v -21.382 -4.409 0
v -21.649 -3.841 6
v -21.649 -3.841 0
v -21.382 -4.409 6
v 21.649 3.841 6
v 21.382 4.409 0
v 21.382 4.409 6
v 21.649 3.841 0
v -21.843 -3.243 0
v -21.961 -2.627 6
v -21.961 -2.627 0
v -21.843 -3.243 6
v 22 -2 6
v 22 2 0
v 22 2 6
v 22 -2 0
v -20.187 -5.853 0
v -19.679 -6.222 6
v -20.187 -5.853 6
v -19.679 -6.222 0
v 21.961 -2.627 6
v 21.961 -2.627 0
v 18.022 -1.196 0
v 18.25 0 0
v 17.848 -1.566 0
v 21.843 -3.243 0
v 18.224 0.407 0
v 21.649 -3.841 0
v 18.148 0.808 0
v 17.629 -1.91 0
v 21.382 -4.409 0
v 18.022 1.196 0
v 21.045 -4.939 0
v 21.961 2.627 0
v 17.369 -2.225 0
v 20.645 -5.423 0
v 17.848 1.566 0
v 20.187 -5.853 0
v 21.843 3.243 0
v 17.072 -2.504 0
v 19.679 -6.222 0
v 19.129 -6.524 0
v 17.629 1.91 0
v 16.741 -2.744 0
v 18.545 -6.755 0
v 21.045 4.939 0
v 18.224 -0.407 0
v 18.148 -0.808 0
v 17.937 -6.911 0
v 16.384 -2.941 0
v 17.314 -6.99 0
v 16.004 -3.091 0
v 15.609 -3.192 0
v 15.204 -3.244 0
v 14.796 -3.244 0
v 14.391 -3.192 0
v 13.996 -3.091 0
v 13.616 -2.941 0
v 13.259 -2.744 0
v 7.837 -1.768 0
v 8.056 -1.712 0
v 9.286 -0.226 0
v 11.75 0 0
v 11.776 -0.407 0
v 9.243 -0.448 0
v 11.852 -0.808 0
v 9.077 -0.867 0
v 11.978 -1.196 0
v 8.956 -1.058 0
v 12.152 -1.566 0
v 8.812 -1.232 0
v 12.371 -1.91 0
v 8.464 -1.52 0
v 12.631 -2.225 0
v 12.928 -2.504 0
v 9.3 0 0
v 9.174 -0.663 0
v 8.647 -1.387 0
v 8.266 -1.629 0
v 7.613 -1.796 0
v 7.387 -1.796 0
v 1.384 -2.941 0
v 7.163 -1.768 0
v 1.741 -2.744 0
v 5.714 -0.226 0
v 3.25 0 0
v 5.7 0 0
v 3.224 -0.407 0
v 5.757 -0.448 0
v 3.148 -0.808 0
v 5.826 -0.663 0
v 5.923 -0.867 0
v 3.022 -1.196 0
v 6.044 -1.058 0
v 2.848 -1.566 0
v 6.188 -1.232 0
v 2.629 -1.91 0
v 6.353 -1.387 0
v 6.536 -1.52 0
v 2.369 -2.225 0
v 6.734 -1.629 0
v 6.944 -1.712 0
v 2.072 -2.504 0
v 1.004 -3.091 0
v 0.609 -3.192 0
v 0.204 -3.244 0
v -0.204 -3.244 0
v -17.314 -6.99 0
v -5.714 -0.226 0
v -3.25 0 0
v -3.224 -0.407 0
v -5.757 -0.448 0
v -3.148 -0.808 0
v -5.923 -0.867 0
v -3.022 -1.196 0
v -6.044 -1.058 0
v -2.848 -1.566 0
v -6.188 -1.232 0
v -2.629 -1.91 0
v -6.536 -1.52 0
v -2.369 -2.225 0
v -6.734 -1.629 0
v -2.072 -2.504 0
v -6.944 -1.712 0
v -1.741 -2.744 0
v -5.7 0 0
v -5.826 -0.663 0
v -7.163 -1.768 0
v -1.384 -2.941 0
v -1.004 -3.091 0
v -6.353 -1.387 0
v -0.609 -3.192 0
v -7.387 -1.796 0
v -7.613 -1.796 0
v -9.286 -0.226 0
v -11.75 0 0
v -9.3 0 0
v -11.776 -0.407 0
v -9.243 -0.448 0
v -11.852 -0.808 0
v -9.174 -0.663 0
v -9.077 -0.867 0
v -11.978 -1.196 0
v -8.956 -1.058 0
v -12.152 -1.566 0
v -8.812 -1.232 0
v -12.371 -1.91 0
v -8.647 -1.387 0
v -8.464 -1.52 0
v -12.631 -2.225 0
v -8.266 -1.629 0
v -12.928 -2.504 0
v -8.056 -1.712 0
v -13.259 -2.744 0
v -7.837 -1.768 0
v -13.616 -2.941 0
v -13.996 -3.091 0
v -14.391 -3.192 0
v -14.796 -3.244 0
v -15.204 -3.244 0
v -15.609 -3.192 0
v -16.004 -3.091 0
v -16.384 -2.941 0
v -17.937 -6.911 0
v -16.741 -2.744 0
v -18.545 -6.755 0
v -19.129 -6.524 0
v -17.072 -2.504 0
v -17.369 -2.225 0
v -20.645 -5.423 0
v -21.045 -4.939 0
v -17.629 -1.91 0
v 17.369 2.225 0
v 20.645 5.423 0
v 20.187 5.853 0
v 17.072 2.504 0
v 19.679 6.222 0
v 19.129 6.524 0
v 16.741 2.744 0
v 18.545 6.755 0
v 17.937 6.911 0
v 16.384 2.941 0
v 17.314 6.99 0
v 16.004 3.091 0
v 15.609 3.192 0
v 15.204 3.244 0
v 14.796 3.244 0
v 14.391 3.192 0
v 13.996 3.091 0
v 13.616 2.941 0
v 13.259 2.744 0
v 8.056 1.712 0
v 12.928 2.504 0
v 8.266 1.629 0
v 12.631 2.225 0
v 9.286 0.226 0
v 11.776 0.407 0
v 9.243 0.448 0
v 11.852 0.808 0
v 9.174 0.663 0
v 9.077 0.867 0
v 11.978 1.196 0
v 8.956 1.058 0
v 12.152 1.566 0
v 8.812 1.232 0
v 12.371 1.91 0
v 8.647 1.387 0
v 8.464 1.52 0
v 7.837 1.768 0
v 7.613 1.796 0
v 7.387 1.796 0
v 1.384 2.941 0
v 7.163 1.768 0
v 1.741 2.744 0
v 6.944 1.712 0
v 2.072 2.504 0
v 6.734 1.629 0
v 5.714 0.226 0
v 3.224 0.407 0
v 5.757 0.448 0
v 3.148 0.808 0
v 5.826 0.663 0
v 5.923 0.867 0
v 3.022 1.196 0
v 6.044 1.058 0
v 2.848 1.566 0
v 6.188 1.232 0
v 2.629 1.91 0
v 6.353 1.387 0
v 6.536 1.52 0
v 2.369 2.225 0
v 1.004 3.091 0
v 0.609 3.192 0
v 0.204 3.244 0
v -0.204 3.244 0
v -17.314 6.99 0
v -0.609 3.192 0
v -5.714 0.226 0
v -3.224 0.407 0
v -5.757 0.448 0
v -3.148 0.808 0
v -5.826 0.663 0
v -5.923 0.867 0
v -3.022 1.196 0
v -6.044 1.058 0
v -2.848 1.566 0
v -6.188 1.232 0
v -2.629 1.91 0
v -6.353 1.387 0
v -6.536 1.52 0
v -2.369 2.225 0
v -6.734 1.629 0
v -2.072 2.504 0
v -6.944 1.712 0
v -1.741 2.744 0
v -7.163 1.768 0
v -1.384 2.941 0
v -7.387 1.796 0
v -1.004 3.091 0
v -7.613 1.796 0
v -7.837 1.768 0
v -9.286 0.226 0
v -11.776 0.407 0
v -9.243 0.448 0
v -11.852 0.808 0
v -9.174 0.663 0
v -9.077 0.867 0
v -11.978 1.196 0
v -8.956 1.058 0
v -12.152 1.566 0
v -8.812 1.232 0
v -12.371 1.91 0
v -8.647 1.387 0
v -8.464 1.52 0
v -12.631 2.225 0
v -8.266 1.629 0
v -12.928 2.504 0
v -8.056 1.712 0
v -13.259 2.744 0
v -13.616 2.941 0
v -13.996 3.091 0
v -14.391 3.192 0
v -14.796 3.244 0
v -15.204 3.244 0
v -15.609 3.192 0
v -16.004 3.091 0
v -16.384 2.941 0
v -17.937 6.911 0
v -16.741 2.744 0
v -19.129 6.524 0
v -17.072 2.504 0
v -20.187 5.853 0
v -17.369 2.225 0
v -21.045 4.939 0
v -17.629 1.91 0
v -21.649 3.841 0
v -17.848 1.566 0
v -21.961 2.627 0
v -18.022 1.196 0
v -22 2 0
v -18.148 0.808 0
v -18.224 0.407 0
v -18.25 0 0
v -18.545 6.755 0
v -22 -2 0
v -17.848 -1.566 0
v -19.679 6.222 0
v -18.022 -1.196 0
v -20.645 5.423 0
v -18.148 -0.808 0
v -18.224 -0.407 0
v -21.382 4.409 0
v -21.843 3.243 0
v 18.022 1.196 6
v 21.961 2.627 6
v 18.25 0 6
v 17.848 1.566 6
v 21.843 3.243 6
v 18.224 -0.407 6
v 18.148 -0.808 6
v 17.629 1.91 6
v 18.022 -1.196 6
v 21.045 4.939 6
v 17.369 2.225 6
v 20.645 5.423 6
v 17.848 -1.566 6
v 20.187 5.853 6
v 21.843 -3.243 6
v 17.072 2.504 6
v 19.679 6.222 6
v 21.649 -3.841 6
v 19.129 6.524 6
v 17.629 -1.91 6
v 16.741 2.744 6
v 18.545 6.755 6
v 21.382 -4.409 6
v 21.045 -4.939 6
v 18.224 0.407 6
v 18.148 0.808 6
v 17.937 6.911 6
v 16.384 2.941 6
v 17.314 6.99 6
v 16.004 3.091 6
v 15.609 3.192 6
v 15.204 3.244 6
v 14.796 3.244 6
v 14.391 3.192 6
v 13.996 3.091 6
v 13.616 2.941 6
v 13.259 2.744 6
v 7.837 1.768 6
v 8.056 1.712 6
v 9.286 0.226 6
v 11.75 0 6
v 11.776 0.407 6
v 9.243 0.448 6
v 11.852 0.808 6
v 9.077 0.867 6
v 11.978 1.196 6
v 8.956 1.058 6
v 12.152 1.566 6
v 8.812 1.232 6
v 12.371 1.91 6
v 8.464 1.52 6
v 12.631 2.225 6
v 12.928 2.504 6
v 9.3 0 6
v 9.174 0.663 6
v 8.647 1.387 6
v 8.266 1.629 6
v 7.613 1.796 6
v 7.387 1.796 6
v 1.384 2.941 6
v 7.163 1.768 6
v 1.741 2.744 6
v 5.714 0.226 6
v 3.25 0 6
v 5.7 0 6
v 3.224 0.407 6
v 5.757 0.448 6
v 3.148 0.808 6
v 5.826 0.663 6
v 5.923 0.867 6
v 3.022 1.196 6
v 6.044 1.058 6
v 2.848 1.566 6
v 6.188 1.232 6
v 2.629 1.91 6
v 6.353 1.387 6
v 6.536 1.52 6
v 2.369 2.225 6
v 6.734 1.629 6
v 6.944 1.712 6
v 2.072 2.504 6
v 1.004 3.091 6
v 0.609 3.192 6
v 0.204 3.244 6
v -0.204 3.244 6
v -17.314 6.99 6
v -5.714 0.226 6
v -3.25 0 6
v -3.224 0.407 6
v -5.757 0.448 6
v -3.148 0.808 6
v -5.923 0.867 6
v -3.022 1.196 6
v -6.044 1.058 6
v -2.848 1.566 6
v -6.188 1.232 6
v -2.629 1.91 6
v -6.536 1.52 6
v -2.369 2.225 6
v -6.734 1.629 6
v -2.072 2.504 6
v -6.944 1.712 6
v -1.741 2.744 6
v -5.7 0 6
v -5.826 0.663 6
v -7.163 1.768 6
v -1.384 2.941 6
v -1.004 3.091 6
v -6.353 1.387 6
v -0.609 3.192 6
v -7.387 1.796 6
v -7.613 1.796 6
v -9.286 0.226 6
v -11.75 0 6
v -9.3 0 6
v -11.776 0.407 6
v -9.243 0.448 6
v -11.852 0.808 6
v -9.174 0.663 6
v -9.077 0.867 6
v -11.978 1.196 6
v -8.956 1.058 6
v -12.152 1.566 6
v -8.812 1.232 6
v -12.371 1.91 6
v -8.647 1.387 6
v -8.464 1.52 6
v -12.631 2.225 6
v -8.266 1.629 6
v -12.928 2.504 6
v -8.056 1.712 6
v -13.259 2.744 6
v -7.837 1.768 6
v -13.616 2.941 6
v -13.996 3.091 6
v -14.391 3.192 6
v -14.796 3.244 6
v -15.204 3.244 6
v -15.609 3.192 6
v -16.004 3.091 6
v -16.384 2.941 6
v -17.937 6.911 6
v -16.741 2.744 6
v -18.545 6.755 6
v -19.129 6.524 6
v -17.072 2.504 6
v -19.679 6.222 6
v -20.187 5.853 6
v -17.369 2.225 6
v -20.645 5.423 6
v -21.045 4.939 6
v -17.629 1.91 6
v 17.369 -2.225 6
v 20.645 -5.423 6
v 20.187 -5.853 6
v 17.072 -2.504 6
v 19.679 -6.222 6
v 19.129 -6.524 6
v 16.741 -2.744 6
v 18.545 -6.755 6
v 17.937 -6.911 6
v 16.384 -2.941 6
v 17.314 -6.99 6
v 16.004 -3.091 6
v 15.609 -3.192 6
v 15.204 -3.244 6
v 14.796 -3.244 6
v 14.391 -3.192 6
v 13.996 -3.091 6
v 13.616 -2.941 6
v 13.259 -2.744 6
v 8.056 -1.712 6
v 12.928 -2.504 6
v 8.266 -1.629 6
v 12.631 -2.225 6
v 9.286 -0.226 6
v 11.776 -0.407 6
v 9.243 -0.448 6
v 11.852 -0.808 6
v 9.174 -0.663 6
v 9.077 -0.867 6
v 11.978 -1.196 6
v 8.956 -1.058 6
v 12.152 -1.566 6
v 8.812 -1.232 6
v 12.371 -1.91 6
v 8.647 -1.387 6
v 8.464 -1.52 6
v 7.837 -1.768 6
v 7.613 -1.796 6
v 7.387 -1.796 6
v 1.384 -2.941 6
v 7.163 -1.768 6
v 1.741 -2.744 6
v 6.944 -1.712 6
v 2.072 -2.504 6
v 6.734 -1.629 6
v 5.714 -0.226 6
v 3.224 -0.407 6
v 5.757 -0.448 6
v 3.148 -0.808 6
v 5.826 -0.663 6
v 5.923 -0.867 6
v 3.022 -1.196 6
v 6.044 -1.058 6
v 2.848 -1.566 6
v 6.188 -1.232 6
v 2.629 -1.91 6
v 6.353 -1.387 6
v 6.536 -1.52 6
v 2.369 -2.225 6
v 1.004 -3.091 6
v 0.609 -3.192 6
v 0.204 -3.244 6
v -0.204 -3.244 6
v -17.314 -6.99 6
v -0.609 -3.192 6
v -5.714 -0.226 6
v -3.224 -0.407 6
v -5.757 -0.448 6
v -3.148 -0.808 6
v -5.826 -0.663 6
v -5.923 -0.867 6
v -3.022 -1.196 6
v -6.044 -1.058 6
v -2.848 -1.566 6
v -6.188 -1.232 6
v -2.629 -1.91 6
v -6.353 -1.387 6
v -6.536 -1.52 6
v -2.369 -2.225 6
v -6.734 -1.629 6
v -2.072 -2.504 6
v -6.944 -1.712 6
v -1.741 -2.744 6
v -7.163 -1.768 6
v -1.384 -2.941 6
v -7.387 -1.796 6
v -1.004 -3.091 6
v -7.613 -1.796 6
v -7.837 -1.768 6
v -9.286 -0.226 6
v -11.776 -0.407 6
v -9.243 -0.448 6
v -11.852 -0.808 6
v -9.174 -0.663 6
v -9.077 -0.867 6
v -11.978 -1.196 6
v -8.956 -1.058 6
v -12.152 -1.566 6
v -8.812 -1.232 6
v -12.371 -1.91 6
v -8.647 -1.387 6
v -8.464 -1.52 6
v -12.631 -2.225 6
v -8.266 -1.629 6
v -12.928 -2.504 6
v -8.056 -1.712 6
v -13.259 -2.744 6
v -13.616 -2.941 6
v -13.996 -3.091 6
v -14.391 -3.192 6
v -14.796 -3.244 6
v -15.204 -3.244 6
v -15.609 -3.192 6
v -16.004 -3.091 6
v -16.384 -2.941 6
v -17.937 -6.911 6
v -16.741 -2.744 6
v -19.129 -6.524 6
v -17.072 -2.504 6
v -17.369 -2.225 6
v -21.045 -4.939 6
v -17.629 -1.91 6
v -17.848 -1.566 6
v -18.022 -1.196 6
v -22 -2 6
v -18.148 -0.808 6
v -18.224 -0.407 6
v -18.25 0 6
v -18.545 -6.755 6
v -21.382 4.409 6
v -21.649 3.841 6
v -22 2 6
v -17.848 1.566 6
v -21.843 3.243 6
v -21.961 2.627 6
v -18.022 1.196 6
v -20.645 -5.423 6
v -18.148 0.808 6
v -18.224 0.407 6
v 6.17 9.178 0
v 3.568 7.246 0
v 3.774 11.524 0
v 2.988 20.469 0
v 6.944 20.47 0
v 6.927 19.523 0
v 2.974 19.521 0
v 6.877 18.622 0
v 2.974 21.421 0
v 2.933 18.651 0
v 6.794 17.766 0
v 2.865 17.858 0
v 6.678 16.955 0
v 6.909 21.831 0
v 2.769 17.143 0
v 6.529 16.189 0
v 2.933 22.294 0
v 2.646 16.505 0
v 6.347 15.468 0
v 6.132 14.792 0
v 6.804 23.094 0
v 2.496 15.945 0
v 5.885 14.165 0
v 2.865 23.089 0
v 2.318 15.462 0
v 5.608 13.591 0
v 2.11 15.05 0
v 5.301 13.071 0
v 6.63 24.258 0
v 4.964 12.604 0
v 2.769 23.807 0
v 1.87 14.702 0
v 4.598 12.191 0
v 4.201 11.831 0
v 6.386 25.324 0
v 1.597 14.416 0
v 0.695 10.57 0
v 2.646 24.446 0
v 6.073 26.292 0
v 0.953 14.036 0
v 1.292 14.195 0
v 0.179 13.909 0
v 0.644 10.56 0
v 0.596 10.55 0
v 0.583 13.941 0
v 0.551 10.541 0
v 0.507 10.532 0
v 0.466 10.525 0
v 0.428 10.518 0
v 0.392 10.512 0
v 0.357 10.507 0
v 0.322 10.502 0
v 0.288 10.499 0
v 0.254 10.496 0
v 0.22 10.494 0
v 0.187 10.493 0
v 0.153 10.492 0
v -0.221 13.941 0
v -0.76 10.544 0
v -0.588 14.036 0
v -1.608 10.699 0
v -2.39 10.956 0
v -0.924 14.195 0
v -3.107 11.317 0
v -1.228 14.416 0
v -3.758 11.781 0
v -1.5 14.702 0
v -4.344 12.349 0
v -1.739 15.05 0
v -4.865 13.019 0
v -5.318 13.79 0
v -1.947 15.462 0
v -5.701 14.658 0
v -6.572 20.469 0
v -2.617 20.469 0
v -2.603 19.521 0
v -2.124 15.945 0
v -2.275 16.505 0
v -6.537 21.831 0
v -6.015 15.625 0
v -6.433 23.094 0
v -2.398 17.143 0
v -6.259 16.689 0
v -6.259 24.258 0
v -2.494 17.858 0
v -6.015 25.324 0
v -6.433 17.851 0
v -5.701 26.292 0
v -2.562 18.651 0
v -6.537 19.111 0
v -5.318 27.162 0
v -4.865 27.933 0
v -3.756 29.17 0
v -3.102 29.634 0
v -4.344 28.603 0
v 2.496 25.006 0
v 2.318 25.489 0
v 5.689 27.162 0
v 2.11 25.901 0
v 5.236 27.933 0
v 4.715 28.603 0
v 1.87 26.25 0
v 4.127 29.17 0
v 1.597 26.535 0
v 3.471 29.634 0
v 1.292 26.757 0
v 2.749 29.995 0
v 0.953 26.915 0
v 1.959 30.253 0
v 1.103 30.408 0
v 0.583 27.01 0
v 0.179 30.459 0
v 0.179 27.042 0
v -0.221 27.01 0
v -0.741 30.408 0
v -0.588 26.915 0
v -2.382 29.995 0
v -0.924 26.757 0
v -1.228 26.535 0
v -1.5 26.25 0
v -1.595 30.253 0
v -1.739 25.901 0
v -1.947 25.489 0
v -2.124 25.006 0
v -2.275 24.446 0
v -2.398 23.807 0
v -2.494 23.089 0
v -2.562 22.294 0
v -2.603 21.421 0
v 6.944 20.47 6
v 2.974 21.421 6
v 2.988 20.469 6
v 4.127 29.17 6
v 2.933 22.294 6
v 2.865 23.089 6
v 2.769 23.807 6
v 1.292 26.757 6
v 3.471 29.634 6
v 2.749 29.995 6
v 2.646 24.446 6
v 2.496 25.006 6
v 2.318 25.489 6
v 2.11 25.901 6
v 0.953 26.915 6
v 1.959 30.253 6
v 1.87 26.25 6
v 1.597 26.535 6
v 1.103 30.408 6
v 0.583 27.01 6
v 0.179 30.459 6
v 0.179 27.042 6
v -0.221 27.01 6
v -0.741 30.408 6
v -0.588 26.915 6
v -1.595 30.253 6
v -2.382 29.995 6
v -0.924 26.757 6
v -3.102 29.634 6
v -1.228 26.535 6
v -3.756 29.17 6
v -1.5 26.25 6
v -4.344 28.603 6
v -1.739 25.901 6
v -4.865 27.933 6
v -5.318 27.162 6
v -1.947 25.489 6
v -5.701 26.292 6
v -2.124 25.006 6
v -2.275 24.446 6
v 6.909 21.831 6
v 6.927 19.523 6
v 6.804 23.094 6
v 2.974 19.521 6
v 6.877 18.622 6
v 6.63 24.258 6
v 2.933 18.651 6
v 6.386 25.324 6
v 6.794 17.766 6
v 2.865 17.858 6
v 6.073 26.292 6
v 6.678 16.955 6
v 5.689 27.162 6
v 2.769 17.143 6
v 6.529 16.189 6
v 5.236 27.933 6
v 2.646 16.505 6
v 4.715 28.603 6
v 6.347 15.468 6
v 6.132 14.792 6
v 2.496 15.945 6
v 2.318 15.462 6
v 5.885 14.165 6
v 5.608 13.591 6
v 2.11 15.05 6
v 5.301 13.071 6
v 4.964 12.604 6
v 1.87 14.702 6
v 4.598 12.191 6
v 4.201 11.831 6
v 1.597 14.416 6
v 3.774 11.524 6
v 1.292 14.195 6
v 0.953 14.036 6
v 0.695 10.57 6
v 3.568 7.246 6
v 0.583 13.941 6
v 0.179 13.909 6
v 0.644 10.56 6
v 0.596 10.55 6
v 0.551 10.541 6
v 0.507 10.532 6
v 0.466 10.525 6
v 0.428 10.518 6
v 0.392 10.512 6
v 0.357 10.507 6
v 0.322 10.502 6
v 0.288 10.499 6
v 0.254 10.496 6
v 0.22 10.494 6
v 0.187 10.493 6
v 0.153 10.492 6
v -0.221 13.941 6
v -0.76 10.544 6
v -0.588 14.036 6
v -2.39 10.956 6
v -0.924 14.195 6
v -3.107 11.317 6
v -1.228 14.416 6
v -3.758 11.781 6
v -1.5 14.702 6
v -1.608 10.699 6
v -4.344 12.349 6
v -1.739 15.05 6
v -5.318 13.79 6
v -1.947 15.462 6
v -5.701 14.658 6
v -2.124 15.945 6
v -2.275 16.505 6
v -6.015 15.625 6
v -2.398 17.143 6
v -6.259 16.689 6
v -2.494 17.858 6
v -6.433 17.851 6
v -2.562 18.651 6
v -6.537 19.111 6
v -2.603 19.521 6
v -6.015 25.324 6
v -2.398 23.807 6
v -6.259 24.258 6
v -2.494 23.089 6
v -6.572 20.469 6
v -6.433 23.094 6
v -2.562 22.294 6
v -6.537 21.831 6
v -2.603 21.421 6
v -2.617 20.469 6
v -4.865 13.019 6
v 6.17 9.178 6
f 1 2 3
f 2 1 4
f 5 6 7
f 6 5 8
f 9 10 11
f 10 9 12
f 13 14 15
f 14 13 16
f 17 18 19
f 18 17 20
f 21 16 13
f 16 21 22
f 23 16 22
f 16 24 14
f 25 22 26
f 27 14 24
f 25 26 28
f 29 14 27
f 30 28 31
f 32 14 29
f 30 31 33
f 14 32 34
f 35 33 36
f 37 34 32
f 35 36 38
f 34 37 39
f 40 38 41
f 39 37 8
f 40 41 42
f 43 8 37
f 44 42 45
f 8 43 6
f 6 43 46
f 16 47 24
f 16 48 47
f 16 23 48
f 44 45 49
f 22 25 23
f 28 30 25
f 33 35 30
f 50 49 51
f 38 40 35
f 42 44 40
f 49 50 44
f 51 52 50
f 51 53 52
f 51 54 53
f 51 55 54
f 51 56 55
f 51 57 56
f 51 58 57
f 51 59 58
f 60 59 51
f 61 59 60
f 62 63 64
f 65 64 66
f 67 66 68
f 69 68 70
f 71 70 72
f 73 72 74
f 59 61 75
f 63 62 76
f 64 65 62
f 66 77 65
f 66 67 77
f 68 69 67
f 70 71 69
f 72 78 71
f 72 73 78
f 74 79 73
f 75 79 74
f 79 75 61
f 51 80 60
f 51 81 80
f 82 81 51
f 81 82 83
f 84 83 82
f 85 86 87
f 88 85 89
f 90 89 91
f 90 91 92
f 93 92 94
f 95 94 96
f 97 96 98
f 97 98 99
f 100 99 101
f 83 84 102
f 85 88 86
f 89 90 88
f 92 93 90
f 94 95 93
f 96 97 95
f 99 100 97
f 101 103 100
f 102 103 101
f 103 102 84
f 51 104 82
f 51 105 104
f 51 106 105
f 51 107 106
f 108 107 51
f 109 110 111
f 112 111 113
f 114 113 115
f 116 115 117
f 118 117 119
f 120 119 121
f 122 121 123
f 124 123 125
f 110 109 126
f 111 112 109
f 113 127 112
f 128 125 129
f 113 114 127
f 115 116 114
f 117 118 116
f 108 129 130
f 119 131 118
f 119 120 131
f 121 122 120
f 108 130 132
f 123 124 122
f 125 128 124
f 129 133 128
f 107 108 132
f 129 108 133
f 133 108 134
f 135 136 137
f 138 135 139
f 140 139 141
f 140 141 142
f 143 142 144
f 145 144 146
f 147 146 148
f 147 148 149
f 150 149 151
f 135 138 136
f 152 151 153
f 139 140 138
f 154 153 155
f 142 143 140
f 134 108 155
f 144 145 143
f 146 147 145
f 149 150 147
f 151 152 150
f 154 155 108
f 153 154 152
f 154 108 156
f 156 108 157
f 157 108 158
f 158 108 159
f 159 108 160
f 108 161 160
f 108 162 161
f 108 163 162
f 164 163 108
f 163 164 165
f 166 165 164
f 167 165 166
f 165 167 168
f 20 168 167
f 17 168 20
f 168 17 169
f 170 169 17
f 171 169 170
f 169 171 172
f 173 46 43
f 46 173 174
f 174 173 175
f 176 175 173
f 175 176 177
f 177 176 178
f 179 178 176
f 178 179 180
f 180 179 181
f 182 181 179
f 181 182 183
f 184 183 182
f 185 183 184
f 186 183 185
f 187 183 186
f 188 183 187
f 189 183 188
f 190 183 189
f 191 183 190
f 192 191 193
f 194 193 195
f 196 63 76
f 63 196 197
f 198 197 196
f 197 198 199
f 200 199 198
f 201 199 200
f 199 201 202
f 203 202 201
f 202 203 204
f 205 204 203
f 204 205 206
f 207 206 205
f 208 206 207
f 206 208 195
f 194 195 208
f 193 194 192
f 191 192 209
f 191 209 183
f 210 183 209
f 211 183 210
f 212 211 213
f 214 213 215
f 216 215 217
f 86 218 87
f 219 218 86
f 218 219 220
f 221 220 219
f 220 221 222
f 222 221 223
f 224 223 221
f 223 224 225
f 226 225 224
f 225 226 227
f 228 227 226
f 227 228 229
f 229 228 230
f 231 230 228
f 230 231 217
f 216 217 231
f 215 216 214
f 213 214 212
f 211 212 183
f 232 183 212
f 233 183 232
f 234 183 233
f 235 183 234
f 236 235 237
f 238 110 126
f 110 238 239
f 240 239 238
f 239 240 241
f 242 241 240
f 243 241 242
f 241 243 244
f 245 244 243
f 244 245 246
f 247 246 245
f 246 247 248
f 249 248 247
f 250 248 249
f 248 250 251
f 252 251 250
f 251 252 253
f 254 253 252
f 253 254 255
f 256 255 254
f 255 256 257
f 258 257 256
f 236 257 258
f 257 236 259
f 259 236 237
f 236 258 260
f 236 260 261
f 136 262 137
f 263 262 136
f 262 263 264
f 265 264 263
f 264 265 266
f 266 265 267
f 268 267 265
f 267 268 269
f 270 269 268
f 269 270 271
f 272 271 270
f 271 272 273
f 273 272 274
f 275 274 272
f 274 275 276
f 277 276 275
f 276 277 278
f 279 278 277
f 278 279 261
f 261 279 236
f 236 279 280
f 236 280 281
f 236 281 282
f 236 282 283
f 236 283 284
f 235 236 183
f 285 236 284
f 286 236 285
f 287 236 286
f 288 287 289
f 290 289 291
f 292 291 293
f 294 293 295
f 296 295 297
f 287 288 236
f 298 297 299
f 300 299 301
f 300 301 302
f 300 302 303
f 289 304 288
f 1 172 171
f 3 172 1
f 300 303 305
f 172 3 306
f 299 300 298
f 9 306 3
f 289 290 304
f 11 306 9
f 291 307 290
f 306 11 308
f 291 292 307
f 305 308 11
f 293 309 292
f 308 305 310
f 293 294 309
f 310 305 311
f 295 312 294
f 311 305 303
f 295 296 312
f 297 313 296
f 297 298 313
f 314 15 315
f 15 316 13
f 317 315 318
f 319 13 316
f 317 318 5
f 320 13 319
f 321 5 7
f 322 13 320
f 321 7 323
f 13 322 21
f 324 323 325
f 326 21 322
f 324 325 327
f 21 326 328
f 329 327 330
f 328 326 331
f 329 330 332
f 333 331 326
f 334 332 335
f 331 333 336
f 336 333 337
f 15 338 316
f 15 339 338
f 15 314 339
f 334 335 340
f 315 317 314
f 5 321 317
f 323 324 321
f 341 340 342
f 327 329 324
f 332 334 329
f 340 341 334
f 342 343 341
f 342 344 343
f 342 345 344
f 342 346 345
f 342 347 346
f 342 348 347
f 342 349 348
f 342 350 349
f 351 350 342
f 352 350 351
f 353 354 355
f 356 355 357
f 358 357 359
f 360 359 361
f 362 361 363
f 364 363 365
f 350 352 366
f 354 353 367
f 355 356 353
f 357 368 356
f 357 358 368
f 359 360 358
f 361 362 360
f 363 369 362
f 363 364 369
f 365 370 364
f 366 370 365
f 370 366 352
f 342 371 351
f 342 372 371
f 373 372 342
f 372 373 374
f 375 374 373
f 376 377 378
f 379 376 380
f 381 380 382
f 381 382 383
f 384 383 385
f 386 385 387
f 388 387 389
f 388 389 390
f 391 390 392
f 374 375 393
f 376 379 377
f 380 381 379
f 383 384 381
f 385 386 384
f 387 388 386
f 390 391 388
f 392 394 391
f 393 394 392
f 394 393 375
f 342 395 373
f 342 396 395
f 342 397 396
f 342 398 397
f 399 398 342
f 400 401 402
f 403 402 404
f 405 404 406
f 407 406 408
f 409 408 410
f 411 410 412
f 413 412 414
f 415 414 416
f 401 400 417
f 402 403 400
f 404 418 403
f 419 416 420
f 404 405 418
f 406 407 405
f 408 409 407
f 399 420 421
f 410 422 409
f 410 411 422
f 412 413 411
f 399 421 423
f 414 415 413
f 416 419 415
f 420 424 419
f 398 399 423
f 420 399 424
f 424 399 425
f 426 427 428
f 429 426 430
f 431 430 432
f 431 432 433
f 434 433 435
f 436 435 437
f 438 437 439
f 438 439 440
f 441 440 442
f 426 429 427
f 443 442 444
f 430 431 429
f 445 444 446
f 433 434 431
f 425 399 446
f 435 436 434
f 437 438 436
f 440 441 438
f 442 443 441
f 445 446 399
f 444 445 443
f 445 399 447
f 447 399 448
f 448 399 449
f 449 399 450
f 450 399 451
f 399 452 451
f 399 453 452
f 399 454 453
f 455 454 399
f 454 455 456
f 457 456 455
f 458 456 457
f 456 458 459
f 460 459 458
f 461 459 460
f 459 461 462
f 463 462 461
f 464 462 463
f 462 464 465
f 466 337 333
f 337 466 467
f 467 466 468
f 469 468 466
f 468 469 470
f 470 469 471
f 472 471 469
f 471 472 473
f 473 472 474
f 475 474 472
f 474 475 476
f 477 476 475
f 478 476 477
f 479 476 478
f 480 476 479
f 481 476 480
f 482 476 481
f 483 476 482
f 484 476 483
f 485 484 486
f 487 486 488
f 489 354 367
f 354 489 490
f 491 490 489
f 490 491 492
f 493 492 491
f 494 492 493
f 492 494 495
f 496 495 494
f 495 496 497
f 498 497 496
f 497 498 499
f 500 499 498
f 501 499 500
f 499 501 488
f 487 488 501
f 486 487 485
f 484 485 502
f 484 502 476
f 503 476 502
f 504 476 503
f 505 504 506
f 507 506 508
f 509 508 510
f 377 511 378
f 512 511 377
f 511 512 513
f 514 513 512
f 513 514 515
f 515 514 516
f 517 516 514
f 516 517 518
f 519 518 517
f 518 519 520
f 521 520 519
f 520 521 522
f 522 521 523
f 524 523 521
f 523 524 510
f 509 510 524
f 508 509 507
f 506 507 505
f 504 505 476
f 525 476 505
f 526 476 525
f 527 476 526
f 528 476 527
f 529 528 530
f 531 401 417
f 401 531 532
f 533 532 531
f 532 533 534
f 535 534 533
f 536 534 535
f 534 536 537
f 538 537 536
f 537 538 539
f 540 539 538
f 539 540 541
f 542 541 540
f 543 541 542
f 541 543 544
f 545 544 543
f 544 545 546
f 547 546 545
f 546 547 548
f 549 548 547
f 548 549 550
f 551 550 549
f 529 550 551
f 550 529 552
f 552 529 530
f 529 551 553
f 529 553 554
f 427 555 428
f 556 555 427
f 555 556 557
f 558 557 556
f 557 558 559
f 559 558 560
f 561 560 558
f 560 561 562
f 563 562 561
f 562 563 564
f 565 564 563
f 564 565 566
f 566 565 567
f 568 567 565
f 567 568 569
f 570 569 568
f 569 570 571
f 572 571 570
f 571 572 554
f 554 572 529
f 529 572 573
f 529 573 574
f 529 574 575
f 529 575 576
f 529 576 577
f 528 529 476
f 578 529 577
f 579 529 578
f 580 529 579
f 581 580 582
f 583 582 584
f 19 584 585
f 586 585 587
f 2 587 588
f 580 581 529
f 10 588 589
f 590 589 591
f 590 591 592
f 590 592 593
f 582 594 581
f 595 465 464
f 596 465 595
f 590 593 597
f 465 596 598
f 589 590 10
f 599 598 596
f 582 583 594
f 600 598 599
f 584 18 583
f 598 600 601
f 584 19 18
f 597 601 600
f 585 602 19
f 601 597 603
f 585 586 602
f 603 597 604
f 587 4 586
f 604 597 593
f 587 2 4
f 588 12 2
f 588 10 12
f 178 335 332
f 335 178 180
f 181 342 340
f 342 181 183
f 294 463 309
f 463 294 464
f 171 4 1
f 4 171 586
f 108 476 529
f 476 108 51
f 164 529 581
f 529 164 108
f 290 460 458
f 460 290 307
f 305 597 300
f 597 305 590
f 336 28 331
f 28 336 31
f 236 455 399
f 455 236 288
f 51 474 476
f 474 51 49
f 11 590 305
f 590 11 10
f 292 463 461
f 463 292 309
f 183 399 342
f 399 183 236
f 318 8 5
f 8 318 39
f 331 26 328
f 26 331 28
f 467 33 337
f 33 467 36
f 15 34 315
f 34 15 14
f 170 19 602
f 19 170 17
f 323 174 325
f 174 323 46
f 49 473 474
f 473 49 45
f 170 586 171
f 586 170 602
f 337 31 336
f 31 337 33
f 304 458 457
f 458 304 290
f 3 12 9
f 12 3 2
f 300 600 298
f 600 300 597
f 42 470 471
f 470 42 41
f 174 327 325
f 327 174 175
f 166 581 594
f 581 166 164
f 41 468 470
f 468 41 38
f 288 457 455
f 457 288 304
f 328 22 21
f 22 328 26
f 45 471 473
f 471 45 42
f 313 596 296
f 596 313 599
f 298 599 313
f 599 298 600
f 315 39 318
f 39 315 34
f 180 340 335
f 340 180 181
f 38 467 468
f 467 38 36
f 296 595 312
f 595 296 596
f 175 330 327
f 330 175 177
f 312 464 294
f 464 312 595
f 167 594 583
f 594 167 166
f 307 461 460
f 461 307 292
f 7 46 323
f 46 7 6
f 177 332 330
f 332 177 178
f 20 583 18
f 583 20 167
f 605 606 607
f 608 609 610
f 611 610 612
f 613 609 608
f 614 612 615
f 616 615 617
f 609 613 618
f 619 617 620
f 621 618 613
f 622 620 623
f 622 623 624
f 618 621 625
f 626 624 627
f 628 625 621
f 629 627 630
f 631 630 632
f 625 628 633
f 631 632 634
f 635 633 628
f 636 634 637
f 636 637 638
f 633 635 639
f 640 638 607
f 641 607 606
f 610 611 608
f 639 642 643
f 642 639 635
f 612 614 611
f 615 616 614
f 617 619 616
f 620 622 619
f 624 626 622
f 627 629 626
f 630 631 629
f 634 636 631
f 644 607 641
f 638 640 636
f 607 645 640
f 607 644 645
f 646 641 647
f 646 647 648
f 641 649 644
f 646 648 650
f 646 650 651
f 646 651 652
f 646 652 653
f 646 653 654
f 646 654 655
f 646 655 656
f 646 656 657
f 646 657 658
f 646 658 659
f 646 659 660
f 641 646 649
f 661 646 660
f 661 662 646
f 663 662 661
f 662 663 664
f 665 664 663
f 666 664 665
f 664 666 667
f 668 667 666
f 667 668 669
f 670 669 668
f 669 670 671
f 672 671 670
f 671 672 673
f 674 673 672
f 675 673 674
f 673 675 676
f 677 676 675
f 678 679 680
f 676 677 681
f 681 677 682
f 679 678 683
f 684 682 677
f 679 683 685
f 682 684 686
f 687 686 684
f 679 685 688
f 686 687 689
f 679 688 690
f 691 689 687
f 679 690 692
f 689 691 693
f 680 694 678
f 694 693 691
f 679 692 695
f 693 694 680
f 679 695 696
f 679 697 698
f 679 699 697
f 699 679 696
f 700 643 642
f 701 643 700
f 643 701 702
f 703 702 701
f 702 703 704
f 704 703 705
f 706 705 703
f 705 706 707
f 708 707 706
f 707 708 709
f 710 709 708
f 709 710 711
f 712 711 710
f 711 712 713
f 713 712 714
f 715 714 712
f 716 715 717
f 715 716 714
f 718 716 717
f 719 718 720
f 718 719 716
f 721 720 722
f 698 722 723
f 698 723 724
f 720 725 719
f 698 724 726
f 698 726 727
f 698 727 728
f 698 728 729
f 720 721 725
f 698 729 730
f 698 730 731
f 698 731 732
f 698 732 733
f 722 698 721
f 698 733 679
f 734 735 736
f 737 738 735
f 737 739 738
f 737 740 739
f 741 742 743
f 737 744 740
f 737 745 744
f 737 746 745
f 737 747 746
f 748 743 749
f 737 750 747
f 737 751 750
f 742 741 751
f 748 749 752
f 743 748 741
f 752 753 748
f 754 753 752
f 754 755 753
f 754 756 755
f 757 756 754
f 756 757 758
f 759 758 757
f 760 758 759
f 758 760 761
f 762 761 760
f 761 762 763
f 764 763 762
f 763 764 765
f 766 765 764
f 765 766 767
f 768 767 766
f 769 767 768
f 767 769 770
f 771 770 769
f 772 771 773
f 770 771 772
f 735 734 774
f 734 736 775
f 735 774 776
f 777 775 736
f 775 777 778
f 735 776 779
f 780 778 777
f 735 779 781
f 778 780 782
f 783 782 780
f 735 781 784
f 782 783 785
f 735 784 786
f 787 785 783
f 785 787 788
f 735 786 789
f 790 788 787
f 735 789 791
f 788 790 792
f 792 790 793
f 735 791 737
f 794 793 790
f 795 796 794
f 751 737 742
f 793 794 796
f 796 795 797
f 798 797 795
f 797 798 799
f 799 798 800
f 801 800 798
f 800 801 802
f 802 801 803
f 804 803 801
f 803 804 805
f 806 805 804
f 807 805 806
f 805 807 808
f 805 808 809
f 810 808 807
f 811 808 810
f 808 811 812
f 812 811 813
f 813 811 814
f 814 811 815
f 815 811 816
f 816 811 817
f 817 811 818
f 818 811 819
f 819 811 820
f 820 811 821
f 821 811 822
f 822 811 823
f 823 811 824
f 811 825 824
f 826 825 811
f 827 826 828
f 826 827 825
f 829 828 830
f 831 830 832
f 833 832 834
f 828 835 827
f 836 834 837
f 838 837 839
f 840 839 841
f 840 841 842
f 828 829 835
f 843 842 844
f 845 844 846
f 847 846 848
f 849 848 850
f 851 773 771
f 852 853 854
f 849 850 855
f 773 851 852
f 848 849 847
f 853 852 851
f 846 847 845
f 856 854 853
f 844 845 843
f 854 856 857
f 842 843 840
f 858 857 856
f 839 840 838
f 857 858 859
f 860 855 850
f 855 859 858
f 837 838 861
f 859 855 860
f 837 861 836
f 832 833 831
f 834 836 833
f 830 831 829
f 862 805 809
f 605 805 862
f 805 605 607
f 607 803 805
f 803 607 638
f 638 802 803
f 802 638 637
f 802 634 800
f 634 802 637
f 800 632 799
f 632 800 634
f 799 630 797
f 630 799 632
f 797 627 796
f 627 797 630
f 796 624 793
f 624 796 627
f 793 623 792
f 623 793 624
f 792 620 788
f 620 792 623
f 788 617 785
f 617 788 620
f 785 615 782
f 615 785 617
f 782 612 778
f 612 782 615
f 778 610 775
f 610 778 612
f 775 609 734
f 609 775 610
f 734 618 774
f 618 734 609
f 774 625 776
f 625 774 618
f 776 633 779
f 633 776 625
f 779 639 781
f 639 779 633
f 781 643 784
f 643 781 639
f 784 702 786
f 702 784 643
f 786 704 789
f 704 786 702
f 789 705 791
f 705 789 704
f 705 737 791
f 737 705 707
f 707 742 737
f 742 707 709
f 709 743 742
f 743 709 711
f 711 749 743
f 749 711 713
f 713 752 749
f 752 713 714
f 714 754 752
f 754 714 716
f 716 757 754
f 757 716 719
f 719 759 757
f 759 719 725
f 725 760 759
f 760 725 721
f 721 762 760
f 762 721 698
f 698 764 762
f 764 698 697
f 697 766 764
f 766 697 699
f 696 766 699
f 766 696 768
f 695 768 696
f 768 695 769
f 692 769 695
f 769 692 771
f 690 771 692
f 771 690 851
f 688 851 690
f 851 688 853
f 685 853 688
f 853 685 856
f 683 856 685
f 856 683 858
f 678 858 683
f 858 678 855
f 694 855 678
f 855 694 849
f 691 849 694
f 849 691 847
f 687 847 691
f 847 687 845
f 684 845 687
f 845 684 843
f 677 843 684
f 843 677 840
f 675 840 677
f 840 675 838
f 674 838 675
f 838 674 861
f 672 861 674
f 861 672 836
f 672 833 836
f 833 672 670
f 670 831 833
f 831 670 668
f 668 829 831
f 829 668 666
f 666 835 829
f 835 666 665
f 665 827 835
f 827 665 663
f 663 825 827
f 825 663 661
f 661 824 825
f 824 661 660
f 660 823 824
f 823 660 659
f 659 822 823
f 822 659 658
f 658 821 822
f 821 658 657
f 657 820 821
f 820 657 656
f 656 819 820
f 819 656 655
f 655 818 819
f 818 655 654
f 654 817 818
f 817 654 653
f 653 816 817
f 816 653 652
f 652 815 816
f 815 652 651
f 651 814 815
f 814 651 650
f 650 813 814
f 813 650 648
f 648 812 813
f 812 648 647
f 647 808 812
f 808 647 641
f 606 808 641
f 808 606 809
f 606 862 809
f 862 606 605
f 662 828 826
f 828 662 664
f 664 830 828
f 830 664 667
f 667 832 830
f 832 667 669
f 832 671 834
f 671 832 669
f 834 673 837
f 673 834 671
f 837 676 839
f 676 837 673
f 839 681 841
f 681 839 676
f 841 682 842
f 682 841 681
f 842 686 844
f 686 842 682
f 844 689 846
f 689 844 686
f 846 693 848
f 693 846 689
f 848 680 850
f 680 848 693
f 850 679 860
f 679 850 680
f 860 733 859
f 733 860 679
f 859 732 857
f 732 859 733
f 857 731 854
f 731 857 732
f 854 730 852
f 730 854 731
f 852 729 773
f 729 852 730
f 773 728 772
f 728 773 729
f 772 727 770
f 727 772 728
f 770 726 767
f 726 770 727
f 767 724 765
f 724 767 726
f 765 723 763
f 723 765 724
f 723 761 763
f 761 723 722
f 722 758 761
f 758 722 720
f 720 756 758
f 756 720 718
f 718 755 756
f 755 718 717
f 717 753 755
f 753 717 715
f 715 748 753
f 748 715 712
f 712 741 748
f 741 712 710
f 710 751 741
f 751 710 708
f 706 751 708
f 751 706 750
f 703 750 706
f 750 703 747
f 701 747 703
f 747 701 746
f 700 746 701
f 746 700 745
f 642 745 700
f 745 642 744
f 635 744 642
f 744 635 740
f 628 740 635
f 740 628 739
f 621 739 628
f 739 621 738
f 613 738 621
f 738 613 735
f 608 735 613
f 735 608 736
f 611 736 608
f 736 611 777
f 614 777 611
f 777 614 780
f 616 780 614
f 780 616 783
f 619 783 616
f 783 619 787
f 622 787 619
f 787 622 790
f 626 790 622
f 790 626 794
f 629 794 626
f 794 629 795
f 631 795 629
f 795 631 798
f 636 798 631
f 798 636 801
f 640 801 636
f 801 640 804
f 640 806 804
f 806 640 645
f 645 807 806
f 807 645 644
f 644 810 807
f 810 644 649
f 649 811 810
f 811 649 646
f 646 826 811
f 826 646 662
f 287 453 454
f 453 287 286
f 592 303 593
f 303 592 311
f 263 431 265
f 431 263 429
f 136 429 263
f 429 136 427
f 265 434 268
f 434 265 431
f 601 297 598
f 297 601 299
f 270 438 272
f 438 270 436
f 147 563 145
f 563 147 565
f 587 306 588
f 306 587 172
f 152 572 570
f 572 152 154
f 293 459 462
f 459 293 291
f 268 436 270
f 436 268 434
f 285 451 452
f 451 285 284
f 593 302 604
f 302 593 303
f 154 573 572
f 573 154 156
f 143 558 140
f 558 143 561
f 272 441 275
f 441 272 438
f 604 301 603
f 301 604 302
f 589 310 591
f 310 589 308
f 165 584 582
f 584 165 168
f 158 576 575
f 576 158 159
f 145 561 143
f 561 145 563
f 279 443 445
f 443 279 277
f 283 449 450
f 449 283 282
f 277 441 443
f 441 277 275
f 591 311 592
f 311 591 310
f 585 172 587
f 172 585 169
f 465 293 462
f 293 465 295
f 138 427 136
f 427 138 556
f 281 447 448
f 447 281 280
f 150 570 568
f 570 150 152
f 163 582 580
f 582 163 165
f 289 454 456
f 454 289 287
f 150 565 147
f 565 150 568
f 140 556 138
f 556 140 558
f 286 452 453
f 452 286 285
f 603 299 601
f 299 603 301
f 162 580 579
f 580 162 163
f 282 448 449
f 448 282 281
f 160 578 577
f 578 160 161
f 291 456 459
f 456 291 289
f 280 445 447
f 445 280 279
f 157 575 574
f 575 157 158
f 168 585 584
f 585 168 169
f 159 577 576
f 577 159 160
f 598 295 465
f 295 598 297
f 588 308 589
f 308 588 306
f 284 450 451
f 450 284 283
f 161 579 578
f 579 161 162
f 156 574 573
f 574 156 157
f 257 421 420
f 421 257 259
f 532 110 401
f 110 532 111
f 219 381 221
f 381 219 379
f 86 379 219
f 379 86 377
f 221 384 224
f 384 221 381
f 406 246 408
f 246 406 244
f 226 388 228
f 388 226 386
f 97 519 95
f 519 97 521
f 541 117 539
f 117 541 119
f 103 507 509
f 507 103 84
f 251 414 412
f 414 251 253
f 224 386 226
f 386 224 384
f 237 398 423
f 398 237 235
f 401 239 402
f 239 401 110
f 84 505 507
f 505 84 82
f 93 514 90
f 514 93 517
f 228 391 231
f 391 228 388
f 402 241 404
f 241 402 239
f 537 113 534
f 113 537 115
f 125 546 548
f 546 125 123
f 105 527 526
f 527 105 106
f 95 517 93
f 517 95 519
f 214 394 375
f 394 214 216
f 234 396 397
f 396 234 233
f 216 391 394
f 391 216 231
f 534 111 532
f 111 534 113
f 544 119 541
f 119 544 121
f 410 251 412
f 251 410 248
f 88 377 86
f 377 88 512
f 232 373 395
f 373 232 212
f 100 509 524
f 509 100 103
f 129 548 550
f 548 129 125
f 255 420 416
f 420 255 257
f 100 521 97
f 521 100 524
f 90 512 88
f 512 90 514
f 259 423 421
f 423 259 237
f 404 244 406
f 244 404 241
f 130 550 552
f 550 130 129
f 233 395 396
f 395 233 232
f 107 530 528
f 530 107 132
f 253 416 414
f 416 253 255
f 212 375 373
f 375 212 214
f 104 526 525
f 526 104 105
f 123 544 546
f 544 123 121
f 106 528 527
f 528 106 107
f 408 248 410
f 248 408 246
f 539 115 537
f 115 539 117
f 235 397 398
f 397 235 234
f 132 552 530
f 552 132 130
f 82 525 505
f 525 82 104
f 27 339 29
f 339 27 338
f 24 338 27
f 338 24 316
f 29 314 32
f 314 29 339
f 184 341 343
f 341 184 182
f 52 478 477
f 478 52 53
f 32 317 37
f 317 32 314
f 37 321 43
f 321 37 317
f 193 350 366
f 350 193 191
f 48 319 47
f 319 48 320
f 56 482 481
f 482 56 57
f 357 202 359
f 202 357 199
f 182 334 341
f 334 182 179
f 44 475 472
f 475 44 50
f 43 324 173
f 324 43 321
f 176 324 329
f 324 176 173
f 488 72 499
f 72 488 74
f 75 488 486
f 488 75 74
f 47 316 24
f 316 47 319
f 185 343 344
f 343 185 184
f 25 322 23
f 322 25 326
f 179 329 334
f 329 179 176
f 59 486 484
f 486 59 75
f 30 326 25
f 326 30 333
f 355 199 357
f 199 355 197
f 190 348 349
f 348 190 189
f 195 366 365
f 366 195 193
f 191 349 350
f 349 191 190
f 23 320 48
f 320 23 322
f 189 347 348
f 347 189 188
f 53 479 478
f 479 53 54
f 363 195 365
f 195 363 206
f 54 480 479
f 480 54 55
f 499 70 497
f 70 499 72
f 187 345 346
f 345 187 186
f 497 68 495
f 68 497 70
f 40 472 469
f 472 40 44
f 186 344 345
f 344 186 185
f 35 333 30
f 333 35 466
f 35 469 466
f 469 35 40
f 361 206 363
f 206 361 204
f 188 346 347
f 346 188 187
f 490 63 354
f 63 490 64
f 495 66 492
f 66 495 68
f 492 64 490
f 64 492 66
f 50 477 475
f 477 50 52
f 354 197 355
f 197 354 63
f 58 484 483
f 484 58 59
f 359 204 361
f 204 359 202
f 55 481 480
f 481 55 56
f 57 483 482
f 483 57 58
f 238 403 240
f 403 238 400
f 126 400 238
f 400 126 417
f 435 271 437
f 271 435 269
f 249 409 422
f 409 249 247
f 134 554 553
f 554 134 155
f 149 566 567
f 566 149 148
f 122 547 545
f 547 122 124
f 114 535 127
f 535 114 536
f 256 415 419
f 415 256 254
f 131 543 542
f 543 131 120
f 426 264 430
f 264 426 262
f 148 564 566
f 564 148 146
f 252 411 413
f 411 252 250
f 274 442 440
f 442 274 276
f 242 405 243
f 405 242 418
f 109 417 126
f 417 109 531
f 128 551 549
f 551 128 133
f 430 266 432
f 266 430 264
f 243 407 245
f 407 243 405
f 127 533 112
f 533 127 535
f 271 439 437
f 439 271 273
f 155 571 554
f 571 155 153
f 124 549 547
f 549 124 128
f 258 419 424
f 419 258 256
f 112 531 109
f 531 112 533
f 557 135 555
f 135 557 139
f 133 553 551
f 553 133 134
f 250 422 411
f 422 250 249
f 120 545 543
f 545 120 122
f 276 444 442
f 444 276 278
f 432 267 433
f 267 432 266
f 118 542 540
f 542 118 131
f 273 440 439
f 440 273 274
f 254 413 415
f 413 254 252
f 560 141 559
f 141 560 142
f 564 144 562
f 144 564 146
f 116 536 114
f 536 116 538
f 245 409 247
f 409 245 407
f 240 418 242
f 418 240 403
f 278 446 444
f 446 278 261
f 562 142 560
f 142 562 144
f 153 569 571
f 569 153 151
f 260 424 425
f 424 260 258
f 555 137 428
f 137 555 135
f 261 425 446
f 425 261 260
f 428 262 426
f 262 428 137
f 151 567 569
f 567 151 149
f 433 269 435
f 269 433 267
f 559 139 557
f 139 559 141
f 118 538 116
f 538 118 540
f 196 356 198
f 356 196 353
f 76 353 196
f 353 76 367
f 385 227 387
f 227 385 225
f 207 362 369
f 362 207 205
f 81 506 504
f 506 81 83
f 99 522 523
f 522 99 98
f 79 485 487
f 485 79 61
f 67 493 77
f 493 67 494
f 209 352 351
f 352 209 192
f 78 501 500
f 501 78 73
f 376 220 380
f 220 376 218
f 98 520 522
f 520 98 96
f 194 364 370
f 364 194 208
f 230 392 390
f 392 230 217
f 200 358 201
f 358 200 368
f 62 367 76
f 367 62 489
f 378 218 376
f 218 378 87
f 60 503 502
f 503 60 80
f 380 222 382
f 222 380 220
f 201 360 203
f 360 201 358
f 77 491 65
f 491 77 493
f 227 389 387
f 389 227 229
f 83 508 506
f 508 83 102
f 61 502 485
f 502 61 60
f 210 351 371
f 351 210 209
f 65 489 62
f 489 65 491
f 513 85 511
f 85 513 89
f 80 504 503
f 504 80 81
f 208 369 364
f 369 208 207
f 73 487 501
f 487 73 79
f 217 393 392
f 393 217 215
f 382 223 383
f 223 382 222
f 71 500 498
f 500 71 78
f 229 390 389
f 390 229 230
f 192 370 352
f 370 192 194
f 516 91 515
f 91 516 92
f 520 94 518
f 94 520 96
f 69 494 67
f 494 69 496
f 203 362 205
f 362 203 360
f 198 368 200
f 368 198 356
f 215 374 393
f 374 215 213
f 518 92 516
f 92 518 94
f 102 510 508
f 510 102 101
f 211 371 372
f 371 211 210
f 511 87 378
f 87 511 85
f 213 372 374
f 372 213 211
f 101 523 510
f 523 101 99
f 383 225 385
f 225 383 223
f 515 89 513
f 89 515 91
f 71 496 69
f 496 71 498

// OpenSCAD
$fn = 50;


difference() {
	union() {
		hull() {
			translate(v = [-17.0000000000, 2.0000000000, 0]) {
				cylinder(h = 6, r = 5);
			}
			translate(v = [17.0000000000, 2.0000000000, 0]) {
				cylinder(h = 6, r = 5);
			}
			translate(v = [-17.0000000000, -2.0000000000, 0]) {
				cylinder(h = 6, r = 5);
			}
			translate(v = [17.0000000000, -2.0000000000, 0]) {
				cylinder(h = 6, r = 5);
			}
		}
		translate(v = [0, 30.0000000000, 0]) {
			linear_extrude(height = 6) {
				text(font = "DejaVu Sans Mono:style=Bold", halign = "center", size = 19.0000000000, text = "Q", valign = "top");
			}
		}
	}
	union() {
		translate(v = [-15.0000000000, 0.0000000000, 0]) {
			translate(v = [0, 0, -100]) {
				cylinder(h = 200, r = 3.2500000000);
			}
		}
		translate(v = [0, 0, -100]) {
			cylinder(h = 200, r = 3.2500000000);
		}
		translate(v = [15.0000000000, 0.0000000000, 0]) {
			translate(v = [0, 0, -100]) {
				cylinder(h = 200, r = 3.2500000000);
			}
		}
		translate(v = [-15.0000000000, 0.0000000000, 0]) {
			translate(v = [0, 0, -100]) {
				cylinder(h = 200, r = 1.8000000000);
			}
		}
		translate(v = [-7.5000000000, 0.0000000000, 0]) {
			translate(v = [0, 0, -100]) {
				cylinder(h = 200, r = 1.8000000000);
			}
		}
		translate(v = [0, 0, -100]) {
			cylinder(h = 200, r = 1.8000000000);
		}
		translate(v = [7.5000000000, 0.0000000000, 0]) {
			translate(v = [0, 0, -100]) {
				cylinder(h = 200, r = 1.8000000000);
			}
		}
		translate(v = [15.0000000000, 0.0000000000, 0]) {
			translate(v = [0, 0, -100]) {
				cylinder(h = 200, r = 1.8000000000);
			}
		}
	}
}
